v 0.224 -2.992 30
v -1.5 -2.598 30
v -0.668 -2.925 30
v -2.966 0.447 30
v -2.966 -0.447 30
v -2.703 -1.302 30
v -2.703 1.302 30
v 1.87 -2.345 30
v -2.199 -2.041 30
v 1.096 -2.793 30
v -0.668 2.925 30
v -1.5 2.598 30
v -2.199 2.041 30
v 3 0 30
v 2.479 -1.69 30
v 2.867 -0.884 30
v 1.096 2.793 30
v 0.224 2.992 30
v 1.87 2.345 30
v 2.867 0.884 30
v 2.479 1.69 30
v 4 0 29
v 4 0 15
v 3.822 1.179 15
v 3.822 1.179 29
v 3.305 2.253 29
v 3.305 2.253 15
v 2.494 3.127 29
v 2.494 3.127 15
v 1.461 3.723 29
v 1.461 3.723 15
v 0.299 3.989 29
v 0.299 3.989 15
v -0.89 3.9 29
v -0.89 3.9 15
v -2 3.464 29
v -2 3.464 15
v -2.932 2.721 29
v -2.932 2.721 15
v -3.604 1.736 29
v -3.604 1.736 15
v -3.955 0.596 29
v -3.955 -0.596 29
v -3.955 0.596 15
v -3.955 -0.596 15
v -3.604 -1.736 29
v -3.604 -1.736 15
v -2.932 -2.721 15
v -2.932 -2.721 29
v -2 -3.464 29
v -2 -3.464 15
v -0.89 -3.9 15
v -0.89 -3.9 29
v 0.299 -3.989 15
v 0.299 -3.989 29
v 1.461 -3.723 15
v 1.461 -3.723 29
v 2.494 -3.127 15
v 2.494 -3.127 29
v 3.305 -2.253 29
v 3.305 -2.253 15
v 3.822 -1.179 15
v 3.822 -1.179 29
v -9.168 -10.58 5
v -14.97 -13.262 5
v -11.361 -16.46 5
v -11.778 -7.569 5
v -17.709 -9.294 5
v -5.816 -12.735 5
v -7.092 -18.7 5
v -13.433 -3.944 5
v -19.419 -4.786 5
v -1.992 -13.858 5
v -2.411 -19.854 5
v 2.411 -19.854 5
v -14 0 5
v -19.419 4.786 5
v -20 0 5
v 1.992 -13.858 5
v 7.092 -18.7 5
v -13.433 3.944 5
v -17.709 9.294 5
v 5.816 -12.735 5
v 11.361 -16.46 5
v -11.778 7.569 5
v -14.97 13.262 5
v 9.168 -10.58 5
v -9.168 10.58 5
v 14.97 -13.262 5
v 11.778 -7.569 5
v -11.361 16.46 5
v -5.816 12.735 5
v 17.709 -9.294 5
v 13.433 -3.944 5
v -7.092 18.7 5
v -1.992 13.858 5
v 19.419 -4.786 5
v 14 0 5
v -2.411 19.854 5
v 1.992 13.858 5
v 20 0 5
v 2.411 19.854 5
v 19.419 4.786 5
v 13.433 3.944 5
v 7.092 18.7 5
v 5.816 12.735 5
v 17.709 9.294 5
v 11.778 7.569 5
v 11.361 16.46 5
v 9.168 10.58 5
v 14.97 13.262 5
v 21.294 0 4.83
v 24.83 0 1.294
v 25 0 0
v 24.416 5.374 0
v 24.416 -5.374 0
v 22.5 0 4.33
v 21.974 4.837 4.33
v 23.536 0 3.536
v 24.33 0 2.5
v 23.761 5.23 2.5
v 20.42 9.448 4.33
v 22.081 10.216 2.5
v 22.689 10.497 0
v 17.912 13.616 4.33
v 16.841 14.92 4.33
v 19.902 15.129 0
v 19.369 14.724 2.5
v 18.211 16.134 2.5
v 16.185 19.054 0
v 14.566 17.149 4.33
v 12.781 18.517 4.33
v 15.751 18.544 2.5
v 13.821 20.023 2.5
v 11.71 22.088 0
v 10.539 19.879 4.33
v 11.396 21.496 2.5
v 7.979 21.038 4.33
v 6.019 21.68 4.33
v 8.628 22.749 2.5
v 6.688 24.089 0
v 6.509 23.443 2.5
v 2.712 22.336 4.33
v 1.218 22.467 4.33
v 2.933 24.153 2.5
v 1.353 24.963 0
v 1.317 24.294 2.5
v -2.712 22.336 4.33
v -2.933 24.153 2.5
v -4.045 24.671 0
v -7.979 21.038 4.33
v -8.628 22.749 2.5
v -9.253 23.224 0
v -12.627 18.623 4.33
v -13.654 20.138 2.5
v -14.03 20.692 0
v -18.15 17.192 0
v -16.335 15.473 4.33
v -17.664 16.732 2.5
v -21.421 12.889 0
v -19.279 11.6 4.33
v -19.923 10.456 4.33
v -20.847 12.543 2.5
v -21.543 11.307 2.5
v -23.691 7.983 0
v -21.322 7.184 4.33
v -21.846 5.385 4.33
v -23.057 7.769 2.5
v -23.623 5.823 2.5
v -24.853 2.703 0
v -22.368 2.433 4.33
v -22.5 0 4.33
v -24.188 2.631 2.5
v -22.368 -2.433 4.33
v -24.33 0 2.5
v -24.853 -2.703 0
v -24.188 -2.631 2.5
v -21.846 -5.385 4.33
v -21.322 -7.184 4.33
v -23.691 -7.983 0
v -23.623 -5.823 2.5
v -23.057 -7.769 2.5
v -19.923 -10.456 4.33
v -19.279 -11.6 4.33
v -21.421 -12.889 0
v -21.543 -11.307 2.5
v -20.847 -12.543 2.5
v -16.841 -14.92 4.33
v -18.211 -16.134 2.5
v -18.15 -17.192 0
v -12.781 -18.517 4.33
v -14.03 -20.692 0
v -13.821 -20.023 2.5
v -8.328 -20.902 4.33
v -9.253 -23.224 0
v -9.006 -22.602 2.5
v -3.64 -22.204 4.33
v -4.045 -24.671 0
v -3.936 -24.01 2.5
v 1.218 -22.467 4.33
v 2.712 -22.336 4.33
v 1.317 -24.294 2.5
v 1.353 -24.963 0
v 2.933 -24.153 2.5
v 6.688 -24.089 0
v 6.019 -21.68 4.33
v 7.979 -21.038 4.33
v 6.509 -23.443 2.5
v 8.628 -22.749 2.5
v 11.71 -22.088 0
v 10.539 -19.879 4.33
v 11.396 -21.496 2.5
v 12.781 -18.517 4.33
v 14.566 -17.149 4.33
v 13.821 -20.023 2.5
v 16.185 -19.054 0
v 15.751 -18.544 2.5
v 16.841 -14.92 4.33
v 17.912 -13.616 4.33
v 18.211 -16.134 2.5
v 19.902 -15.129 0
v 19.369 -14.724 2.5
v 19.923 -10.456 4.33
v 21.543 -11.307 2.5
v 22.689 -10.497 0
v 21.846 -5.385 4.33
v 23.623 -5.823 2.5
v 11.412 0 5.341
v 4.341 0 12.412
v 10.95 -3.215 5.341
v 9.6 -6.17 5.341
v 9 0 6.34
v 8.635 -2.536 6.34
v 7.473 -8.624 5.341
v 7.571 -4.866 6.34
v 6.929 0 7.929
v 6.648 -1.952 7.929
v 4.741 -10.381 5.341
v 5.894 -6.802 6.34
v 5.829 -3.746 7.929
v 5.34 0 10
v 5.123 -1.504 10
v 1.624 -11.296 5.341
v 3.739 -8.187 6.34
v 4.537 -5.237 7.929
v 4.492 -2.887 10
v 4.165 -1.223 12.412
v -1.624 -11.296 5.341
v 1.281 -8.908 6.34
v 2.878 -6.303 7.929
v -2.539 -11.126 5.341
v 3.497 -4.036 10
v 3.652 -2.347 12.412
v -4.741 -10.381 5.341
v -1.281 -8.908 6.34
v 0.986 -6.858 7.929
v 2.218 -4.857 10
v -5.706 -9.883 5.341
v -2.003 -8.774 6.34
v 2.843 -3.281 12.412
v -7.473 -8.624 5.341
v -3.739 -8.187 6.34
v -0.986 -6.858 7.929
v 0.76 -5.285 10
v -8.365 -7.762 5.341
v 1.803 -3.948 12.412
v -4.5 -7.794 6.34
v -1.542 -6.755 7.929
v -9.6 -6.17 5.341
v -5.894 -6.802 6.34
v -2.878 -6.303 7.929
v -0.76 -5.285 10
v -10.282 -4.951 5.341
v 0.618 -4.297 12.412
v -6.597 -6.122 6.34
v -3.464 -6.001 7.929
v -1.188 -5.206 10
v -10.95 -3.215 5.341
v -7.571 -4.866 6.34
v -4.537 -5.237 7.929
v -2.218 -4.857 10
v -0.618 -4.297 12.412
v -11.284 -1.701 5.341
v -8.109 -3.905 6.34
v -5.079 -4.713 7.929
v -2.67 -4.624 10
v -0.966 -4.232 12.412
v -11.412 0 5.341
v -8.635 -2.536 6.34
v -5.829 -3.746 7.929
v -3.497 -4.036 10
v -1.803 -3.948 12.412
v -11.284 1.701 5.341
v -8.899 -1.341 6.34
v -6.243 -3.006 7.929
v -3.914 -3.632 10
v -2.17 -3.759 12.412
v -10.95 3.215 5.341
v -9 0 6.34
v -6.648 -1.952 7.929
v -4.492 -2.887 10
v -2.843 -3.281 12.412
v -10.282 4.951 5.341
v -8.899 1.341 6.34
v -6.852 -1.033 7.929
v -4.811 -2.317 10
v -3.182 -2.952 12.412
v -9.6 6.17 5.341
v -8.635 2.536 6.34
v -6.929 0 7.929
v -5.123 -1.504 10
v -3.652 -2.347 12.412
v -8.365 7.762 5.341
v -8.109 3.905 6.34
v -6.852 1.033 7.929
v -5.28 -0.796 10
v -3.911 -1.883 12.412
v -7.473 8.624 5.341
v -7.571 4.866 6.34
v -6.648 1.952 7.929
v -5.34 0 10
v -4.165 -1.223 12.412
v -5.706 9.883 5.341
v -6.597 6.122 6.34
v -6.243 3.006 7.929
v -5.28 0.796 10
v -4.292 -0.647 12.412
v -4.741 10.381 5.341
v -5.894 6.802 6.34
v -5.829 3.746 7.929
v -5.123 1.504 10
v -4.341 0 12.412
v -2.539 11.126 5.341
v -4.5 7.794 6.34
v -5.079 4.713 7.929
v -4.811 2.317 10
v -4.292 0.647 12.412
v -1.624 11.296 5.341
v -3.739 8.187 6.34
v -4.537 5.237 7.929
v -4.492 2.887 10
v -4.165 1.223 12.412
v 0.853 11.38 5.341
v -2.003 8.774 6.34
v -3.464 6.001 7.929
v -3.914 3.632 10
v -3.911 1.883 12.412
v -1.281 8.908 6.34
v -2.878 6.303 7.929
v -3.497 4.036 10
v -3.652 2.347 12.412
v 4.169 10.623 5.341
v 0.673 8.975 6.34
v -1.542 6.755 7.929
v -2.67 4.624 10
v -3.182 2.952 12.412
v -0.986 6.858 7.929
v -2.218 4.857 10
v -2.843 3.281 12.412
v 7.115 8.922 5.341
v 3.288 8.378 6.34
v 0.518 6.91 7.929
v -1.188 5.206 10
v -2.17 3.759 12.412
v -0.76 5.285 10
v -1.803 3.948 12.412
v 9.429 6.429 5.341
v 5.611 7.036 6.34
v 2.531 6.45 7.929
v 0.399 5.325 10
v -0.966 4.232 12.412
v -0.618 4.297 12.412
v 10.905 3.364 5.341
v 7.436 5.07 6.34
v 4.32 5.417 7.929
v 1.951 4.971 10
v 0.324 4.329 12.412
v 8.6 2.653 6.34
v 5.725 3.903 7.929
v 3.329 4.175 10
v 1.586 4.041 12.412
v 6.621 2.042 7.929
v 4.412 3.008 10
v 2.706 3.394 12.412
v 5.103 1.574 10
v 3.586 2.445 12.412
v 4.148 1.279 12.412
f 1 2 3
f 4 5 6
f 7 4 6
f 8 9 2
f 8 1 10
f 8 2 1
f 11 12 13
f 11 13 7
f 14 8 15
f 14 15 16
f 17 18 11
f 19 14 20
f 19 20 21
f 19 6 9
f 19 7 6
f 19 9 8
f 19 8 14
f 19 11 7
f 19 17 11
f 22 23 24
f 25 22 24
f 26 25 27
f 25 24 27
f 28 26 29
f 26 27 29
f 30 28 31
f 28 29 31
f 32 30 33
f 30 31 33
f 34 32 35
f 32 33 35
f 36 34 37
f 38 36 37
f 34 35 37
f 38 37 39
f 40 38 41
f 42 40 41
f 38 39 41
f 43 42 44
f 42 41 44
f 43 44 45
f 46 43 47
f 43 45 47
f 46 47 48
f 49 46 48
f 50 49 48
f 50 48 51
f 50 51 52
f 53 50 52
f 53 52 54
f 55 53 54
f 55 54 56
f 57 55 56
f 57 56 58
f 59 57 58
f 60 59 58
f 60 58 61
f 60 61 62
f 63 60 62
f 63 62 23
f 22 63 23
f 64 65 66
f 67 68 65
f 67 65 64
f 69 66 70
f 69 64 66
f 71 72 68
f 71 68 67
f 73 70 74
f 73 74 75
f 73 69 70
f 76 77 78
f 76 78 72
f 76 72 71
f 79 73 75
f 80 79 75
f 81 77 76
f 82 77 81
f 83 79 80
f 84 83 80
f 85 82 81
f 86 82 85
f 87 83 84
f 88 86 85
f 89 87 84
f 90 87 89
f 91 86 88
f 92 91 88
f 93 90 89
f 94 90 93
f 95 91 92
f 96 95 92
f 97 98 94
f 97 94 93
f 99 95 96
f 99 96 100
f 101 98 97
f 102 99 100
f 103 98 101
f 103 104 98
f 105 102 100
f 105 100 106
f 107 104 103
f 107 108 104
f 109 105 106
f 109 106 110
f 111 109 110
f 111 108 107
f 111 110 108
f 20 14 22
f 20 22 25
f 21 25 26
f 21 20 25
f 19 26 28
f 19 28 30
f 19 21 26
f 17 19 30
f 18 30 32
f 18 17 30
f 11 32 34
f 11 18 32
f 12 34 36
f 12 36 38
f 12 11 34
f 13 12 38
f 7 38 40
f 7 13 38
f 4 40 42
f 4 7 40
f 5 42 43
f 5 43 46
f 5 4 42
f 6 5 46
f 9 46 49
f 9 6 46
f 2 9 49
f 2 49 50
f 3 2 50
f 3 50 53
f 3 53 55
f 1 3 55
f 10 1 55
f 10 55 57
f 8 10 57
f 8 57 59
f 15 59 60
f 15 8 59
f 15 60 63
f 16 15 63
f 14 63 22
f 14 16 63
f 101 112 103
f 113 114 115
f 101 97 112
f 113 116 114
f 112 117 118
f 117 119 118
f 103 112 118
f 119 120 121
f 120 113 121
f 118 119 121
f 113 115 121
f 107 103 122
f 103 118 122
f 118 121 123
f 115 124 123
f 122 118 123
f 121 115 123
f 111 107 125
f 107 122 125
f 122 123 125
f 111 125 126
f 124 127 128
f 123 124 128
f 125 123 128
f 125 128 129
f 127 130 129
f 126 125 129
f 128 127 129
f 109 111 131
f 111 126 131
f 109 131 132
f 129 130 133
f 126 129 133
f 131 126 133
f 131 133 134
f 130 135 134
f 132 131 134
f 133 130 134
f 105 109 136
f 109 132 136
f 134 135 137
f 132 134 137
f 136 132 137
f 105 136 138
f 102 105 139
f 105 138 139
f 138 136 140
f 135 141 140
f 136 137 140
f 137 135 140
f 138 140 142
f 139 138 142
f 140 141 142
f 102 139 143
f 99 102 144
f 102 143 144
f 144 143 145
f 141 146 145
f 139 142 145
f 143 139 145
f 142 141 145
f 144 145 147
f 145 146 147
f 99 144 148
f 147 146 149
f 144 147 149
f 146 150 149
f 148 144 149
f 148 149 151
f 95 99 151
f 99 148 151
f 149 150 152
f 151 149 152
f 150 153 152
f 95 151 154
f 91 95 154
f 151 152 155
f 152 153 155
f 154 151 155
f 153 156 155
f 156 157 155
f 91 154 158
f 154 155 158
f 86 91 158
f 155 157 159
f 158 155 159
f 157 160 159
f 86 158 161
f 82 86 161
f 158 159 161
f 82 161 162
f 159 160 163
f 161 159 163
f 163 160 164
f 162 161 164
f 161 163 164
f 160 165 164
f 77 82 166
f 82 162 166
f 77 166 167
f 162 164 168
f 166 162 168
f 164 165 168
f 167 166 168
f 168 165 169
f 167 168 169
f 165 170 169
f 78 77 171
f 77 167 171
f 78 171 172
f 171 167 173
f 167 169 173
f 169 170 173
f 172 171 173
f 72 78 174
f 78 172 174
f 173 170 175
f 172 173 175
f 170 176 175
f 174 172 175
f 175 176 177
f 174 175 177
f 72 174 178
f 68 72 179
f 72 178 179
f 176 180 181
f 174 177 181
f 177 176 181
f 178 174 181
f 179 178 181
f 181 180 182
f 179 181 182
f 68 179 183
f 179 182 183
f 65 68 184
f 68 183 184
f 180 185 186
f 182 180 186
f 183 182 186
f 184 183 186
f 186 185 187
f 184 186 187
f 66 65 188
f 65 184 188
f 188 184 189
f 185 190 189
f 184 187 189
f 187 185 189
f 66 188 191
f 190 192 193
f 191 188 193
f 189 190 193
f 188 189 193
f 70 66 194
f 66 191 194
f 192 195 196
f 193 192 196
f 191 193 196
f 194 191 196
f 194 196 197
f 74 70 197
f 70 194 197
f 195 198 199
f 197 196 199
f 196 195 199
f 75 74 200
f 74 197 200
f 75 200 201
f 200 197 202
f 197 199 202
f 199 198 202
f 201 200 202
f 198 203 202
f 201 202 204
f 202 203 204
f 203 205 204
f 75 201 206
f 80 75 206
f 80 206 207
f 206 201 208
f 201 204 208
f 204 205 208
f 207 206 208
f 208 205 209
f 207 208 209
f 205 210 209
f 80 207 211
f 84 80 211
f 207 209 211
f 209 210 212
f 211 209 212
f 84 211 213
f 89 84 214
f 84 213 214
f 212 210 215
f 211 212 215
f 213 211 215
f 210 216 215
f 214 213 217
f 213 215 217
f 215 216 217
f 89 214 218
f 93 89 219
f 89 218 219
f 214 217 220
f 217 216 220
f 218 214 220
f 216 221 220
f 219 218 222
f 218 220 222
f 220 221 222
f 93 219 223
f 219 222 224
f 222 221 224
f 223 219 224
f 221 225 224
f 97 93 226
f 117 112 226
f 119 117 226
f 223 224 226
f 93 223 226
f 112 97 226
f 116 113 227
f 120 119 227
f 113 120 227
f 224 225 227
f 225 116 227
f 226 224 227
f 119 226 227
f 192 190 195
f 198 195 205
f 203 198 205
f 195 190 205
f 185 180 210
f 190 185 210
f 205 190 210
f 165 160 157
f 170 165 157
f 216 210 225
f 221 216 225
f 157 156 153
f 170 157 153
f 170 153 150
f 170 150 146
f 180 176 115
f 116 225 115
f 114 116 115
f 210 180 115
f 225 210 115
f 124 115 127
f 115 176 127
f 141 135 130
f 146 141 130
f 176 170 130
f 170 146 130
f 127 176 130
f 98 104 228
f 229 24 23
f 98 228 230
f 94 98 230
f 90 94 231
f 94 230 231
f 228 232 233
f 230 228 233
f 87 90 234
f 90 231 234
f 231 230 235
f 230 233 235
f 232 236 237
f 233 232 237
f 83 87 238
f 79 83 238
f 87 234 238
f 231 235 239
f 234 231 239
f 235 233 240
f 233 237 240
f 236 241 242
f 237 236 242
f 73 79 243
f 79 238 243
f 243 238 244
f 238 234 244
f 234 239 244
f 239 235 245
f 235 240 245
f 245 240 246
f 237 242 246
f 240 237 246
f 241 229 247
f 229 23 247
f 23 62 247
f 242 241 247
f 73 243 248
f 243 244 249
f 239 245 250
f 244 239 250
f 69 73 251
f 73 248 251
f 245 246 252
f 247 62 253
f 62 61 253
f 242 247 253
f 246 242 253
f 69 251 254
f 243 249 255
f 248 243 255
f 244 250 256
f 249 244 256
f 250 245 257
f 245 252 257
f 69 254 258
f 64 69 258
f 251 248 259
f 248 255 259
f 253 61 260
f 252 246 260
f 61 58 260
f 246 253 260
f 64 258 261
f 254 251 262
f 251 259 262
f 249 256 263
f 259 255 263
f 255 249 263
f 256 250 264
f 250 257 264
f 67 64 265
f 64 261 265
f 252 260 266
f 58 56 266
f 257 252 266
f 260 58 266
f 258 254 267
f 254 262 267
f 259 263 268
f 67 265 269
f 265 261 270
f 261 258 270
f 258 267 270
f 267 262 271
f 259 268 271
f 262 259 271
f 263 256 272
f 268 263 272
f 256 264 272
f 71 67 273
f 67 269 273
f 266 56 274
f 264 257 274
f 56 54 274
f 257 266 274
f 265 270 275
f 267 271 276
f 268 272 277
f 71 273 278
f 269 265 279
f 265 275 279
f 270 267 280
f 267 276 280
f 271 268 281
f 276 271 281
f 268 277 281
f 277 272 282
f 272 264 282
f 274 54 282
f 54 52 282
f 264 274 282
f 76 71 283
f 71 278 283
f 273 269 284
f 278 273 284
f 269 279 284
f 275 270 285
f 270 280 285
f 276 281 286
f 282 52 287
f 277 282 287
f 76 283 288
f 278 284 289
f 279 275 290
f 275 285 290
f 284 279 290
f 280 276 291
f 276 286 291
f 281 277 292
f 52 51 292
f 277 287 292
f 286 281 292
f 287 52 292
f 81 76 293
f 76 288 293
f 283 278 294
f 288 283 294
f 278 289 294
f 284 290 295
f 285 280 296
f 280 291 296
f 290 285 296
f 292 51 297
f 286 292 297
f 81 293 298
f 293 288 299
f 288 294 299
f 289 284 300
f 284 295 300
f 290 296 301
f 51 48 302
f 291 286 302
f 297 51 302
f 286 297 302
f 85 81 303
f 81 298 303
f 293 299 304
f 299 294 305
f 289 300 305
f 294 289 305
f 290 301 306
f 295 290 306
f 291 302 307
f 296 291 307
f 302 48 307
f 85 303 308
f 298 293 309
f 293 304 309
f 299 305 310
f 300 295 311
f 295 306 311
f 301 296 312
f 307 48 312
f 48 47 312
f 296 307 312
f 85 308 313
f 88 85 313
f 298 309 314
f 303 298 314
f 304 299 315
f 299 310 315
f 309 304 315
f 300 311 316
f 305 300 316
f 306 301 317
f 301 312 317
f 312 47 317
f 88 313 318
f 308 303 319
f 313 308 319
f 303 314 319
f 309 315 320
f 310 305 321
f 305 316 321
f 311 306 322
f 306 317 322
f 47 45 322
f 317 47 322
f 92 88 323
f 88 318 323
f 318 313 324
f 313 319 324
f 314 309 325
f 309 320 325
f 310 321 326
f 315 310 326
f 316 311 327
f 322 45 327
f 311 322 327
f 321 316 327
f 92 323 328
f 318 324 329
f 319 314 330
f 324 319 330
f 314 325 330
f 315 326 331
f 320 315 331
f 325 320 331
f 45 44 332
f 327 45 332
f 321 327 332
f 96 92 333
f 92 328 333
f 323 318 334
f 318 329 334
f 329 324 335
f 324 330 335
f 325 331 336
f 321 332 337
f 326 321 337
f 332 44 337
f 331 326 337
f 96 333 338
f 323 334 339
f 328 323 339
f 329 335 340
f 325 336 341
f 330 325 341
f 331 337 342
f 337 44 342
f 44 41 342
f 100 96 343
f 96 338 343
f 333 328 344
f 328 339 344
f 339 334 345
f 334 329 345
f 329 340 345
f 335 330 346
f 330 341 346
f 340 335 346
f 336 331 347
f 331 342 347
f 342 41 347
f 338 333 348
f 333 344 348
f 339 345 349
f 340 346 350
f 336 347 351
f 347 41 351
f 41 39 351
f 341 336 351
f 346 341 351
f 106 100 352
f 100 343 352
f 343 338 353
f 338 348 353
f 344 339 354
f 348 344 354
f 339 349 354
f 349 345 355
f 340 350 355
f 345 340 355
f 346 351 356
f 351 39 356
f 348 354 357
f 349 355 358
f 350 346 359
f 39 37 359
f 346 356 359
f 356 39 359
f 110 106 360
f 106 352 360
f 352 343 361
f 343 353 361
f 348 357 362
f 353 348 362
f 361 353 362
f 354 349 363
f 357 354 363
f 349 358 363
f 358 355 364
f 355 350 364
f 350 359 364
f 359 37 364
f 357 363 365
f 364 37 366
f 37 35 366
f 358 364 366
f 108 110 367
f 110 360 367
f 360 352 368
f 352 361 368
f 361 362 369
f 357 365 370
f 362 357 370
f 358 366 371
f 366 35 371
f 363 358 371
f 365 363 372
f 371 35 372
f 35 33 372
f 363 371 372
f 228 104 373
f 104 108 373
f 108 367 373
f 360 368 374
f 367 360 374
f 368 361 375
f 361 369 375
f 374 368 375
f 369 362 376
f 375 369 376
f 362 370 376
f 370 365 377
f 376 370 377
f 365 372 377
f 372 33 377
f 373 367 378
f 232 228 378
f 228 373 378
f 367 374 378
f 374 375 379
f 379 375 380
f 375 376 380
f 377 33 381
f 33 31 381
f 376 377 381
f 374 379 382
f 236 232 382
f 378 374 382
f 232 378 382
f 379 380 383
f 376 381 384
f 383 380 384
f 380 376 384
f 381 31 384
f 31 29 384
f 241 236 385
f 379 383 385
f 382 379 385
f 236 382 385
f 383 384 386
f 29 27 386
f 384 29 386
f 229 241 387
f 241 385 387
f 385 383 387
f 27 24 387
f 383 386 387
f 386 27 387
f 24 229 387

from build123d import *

# Parameters (mm, degrees)
F0_R     = 25
F2_DEPTH = 5
F1_R     = 4
F3_DEPTH = 30
F4_R     = 10
F5_R     = 4.99999
F6_SIZE  = 1


# Not quite as in the source:
# - a fillet or chamfer is up to 0.001 mm smaller than in the source, because OpenCascade refuses the exact size


with BuildPart() as f2:
    # F0 (on Top) → F2 (new body)
    with BuildSketch(Plane.XY):
        Circle(F0_R)
    extrude(amount=F2_DEPTH)

    # F1 (on face) → F3 (join)
    with BuildSketch(Plane.XY):
        Circle(F1_R)
    extrude(amount=F3_DEPTH)

    # F4
    f4_edges = [f2.edges().sort_by_distance(p)[0] for p in [
        (-4, 0, 5),
    ]]
    fillet(f4_edges, radius=F4_R)

    # F5 (radius 5 in the source; OpenCascade refuses exactly that, so slightly less here)
    f5_edges = [f2.edges().sort_by_distance(p)[0] for p in [
        (-25, 0, 5),
    ]]
    fillet(f5_edges, radius=F5_R)

    # F6
    f6_edges = [f2.edges().sort_by_distance(p)[0] for p in [
        (-4, 0, 30),
    ]]
    chamfer(f6_edges, length=F6_SIZE)


solid = f2.part
